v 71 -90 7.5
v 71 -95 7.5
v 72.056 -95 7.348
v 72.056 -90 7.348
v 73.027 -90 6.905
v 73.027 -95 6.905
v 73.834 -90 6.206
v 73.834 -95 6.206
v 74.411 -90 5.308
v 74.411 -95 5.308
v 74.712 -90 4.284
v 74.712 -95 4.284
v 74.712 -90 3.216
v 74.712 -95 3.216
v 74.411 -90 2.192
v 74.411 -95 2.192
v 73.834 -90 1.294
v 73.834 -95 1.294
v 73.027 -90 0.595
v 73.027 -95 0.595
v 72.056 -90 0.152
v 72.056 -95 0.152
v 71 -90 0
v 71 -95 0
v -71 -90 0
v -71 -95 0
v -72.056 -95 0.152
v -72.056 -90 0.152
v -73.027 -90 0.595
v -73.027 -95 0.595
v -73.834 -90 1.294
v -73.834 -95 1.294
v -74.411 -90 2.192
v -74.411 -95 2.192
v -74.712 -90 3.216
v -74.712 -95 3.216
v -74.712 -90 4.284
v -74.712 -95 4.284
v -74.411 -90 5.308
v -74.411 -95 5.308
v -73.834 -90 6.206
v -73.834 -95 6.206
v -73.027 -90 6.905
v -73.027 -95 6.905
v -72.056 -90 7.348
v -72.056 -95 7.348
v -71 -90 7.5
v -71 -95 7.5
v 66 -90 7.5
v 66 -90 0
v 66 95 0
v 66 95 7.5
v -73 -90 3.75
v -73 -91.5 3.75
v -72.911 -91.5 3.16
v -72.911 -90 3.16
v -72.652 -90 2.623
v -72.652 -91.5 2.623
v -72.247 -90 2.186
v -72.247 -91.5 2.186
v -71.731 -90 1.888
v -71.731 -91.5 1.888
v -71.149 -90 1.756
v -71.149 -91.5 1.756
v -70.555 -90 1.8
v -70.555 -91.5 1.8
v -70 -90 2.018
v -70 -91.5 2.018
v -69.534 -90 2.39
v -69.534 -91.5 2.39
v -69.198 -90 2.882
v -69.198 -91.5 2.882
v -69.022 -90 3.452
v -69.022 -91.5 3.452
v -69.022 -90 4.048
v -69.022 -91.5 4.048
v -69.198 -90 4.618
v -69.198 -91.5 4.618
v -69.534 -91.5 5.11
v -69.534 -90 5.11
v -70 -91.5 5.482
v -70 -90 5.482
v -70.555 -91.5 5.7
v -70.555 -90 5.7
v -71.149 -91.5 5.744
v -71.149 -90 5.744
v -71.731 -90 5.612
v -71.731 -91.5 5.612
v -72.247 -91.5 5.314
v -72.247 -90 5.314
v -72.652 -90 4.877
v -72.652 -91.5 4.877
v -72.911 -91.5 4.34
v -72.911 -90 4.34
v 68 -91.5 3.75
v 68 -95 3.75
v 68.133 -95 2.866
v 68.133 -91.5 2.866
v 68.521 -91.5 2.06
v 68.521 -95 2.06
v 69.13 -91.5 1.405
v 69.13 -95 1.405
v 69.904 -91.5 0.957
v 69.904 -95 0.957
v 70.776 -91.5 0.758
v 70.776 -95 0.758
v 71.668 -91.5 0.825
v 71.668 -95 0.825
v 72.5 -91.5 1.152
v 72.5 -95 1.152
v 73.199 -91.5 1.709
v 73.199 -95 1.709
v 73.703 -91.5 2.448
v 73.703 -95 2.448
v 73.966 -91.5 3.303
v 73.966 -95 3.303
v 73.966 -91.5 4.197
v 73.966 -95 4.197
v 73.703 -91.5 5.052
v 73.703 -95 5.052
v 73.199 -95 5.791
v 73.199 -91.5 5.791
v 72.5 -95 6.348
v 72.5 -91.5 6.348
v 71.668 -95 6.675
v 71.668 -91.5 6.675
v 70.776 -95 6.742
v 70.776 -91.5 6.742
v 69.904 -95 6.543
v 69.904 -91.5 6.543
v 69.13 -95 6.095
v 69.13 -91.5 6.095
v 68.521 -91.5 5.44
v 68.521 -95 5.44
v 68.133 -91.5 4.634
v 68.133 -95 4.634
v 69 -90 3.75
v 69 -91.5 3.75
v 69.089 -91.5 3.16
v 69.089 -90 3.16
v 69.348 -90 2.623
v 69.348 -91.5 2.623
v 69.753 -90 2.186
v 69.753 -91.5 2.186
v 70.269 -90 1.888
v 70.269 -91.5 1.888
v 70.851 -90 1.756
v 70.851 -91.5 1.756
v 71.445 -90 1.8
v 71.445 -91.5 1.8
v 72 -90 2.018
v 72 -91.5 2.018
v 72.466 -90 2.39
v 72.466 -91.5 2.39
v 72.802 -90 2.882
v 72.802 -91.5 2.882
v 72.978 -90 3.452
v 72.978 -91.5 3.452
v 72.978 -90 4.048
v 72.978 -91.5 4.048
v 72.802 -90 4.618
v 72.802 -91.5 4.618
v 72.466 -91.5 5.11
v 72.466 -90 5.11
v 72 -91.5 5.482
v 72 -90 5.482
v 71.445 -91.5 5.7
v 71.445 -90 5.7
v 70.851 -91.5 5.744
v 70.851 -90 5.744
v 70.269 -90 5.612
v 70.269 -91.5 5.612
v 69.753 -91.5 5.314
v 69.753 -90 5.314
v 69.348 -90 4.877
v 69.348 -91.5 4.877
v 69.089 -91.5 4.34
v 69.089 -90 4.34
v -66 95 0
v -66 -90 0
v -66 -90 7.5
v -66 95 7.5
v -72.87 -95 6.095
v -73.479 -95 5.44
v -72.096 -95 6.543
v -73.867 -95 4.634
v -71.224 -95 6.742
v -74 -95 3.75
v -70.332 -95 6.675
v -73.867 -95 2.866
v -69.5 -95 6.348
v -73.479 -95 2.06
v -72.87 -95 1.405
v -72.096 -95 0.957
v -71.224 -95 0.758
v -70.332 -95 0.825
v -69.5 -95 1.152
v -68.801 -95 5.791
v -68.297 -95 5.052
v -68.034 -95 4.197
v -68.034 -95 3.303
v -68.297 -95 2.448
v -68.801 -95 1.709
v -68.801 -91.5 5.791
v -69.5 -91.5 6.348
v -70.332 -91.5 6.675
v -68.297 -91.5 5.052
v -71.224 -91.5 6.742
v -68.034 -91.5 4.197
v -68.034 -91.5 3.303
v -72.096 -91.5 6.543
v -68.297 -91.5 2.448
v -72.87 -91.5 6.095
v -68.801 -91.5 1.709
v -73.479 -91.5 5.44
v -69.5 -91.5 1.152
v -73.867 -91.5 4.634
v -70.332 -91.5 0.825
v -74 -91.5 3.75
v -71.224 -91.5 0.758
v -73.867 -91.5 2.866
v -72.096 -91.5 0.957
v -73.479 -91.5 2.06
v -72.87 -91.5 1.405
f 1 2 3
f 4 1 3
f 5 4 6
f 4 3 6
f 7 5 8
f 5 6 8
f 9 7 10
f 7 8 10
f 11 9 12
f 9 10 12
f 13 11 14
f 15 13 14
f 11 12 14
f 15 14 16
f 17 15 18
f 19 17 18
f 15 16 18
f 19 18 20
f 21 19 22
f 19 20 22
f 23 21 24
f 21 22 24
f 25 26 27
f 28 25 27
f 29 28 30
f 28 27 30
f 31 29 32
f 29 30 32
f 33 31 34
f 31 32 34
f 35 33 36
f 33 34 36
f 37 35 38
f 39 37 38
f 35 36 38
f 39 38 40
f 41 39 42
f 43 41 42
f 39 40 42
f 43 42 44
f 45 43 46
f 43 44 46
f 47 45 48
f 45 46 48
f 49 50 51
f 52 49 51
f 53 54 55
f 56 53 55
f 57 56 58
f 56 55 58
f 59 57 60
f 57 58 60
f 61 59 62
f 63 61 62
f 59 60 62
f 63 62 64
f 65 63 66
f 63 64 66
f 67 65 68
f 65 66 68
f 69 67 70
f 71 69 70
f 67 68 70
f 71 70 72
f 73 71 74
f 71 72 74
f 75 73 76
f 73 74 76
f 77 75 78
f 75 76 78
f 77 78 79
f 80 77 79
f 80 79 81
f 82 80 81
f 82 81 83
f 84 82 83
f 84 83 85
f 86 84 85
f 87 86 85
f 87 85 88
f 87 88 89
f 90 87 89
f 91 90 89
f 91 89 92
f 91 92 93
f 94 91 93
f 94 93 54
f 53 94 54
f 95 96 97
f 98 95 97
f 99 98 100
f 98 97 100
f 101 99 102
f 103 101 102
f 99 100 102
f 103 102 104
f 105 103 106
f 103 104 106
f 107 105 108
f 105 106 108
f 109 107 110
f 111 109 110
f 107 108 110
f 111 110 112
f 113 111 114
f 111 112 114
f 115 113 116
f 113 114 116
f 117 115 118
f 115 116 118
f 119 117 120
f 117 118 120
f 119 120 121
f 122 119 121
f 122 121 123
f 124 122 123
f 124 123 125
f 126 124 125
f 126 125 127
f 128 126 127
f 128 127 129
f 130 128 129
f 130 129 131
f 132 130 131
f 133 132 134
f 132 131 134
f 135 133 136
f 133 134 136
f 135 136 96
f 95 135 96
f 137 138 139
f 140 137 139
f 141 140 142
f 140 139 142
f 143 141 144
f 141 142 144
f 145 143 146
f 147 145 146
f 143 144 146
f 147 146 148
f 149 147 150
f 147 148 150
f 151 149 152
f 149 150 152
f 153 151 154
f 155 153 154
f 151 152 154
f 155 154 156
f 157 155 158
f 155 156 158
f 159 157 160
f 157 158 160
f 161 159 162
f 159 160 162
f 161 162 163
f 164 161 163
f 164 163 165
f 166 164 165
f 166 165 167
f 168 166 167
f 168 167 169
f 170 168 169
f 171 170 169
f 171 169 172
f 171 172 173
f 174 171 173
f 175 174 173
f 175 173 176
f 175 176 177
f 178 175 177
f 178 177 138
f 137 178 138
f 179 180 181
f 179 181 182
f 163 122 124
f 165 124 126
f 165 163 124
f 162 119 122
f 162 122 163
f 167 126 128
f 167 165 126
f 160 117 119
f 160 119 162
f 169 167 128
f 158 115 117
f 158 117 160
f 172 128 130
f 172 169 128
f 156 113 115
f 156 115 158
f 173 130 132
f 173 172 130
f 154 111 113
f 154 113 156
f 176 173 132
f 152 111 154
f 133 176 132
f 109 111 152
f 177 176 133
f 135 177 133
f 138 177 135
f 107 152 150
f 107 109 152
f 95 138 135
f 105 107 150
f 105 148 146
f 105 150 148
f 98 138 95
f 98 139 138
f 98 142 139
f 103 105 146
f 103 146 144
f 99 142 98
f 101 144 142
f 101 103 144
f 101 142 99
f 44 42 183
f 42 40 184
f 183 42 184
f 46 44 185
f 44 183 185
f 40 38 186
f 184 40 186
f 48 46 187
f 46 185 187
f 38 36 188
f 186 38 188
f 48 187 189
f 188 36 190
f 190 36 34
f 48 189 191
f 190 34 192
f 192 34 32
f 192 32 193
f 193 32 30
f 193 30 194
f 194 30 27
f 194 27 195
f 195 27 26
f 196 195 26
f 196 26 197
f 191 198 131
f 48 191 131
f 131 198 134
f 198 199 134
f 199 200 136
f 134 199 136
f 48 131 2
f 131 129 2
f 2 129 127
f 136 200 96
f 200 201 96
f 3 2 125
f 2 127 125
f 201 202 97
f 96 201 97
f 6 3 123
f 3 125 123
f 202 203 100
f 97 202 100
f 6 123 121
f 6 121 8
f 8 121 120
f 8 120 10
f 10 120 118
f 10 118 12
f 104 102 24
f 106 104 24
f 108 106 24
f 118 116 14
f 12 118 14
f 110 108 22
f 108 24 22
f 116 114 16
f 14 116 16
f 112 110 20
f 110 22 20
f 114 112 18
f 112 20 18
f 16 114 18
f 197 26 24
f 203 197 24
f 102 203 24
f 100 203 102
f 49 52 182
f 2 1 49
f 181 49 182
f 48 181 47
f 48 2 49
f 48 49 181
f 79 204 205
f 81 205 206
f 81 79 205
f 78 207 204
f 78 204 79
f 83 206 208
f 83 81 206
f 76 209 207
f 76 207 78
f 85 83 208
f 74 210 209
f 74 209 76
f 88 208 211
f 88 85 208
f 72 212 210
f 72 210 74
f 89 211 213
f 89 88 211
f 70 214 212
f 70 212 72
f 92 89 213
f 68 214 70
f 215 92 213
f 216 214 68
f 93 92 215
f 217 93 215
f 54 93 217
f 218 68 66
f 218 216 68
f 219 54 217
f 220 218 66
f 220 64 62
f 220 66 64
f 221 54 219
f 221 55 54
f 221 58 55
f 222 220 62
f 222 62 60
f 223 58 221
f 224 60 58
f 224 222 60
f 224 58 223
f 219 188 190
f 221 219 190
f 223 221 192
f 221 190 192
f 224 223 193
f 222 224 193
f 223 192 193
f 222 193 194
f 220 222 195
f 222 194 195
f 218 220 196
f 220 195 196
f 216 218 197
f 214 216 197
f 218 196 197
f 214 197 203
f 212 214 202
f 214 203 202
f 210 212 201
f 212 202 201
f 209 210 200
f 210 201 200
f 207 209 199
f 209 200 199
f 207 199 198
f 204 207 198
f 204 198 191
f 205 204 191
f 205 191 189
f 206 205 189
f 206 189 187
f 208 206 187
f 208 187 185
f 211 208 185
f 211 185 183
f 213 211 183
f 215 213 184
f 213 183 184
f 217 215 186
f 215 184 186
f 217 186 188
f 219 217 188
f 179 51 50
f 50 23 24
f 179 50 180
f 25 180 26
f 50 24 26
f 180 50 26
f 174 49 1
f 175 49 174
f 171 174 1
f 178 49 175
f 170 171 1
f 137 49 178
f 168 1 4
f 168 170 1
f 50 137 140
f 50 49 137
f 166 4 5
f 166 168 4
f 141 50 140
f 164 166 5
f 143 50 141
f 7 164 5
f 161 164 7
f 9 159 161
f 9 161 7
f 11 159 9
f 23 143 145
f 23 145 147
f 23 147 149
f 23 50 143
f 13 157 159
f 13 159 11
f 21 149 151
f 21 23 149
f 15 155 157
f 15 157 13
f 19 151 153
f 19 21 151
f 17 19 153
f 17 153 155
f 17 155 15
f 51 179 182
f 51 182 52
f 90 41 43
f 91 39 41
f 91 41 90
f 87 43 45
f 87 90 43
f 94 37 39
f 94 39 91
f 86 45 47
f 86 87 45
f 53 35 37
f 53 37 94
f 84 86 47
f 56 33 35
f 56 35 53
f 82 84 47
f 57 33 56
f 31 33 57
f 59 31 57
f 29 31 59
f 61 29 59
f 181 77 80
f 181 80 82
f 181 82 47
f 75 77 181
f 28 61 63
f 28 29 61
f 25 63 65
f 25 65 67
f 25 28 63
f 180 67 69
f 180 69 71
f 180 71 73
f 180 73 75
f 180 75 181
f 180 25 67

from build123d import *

# Parameters (mm, degrees)
SKETCH1_W           = 132
SKETCH1_H           = 190
BOSS_EXTRUDE1_DEPTH = 7.5
SKETCH2_W           = 5
SKETCH2_H           = 7.5
BOSS_EXTRUDE2_DEPTH = 5
SKETCH3_R           = 2
CUT_EXTRUDE1_DEPTH  = 5
SKETCH4_R           = 3
CUT_EXTRUDE2_DEPTH  = 3.5


with BuildPart() as part:
    # Sketch1 → Boss-Extrude1 (new body)
    with BuildSketch(Plane.XY):
        Rectangle(SKETCH1_W, SKETCH1_H)
    extrude(amount=BOSS_EXTRUDE1_DEPTH)

    # Sketch2 → Boss-Extrude2 (add)
    with BuildSketch(Plane(origin=(0, -95, 0), x_dir=(-1, 0, 0), z_dir=(0, -1, 0))):
        with BuildLine():
            ThreePointArc((71, 0), (74.75, -3.75), (71, -7.5))
            Line((71, -7.5), (71, 0))
        make_face()
        with Locations((68.5, -3.75)):
            Rectangle(SKETCH2_W, SKETCH2_H)
        with BuildLine():
            ThreePointArc((-71, -7.5), (-74.75, -3.75), (-71, 0))
            Line((-71, 0), (-71, -7.5))
        make_face()
        with Locations((-68.5, -3.75)):
            Rectangle(SKETCH2_W, SKETCH2_H)
    extrude(amount=-BOSS_EXTRUDE2_DEPTH)

    # Sketch3 → Cut-Extrude1 (cut)
    with BuildSketch(Plane(origin=(0, -95, 0), x_dir=(-1, 0, 0), z_dir=(0, -1, 0))):
        with Locations((71, -3.75)):
            Circle(SKETCH3_R)
        with Locations((-71, -3.75)):
            Circle(SKETCH3_R)
    extrude(amount=-CUT_EXTRUDE1_DEPTH, mode=Mode.SUBTRACT)

    # Sketch4 → Cut-Extrude2 (cut)
    with BuildSketch(Plane(origin=(0, -95, 0), x_dir=(-1, 0, 0), z_dir=(0, -1, 0))):
        with Locations((71, -3.75)):
            Circle(SKETCH4_R)
        with Locations((-71, -3.75)):
            Circle(SKETCH4_R)
    extrude(amount=-CUT_EXTRUDE2_DEPTH, mode=Mode.SUBTRACT)


solid = part.part
